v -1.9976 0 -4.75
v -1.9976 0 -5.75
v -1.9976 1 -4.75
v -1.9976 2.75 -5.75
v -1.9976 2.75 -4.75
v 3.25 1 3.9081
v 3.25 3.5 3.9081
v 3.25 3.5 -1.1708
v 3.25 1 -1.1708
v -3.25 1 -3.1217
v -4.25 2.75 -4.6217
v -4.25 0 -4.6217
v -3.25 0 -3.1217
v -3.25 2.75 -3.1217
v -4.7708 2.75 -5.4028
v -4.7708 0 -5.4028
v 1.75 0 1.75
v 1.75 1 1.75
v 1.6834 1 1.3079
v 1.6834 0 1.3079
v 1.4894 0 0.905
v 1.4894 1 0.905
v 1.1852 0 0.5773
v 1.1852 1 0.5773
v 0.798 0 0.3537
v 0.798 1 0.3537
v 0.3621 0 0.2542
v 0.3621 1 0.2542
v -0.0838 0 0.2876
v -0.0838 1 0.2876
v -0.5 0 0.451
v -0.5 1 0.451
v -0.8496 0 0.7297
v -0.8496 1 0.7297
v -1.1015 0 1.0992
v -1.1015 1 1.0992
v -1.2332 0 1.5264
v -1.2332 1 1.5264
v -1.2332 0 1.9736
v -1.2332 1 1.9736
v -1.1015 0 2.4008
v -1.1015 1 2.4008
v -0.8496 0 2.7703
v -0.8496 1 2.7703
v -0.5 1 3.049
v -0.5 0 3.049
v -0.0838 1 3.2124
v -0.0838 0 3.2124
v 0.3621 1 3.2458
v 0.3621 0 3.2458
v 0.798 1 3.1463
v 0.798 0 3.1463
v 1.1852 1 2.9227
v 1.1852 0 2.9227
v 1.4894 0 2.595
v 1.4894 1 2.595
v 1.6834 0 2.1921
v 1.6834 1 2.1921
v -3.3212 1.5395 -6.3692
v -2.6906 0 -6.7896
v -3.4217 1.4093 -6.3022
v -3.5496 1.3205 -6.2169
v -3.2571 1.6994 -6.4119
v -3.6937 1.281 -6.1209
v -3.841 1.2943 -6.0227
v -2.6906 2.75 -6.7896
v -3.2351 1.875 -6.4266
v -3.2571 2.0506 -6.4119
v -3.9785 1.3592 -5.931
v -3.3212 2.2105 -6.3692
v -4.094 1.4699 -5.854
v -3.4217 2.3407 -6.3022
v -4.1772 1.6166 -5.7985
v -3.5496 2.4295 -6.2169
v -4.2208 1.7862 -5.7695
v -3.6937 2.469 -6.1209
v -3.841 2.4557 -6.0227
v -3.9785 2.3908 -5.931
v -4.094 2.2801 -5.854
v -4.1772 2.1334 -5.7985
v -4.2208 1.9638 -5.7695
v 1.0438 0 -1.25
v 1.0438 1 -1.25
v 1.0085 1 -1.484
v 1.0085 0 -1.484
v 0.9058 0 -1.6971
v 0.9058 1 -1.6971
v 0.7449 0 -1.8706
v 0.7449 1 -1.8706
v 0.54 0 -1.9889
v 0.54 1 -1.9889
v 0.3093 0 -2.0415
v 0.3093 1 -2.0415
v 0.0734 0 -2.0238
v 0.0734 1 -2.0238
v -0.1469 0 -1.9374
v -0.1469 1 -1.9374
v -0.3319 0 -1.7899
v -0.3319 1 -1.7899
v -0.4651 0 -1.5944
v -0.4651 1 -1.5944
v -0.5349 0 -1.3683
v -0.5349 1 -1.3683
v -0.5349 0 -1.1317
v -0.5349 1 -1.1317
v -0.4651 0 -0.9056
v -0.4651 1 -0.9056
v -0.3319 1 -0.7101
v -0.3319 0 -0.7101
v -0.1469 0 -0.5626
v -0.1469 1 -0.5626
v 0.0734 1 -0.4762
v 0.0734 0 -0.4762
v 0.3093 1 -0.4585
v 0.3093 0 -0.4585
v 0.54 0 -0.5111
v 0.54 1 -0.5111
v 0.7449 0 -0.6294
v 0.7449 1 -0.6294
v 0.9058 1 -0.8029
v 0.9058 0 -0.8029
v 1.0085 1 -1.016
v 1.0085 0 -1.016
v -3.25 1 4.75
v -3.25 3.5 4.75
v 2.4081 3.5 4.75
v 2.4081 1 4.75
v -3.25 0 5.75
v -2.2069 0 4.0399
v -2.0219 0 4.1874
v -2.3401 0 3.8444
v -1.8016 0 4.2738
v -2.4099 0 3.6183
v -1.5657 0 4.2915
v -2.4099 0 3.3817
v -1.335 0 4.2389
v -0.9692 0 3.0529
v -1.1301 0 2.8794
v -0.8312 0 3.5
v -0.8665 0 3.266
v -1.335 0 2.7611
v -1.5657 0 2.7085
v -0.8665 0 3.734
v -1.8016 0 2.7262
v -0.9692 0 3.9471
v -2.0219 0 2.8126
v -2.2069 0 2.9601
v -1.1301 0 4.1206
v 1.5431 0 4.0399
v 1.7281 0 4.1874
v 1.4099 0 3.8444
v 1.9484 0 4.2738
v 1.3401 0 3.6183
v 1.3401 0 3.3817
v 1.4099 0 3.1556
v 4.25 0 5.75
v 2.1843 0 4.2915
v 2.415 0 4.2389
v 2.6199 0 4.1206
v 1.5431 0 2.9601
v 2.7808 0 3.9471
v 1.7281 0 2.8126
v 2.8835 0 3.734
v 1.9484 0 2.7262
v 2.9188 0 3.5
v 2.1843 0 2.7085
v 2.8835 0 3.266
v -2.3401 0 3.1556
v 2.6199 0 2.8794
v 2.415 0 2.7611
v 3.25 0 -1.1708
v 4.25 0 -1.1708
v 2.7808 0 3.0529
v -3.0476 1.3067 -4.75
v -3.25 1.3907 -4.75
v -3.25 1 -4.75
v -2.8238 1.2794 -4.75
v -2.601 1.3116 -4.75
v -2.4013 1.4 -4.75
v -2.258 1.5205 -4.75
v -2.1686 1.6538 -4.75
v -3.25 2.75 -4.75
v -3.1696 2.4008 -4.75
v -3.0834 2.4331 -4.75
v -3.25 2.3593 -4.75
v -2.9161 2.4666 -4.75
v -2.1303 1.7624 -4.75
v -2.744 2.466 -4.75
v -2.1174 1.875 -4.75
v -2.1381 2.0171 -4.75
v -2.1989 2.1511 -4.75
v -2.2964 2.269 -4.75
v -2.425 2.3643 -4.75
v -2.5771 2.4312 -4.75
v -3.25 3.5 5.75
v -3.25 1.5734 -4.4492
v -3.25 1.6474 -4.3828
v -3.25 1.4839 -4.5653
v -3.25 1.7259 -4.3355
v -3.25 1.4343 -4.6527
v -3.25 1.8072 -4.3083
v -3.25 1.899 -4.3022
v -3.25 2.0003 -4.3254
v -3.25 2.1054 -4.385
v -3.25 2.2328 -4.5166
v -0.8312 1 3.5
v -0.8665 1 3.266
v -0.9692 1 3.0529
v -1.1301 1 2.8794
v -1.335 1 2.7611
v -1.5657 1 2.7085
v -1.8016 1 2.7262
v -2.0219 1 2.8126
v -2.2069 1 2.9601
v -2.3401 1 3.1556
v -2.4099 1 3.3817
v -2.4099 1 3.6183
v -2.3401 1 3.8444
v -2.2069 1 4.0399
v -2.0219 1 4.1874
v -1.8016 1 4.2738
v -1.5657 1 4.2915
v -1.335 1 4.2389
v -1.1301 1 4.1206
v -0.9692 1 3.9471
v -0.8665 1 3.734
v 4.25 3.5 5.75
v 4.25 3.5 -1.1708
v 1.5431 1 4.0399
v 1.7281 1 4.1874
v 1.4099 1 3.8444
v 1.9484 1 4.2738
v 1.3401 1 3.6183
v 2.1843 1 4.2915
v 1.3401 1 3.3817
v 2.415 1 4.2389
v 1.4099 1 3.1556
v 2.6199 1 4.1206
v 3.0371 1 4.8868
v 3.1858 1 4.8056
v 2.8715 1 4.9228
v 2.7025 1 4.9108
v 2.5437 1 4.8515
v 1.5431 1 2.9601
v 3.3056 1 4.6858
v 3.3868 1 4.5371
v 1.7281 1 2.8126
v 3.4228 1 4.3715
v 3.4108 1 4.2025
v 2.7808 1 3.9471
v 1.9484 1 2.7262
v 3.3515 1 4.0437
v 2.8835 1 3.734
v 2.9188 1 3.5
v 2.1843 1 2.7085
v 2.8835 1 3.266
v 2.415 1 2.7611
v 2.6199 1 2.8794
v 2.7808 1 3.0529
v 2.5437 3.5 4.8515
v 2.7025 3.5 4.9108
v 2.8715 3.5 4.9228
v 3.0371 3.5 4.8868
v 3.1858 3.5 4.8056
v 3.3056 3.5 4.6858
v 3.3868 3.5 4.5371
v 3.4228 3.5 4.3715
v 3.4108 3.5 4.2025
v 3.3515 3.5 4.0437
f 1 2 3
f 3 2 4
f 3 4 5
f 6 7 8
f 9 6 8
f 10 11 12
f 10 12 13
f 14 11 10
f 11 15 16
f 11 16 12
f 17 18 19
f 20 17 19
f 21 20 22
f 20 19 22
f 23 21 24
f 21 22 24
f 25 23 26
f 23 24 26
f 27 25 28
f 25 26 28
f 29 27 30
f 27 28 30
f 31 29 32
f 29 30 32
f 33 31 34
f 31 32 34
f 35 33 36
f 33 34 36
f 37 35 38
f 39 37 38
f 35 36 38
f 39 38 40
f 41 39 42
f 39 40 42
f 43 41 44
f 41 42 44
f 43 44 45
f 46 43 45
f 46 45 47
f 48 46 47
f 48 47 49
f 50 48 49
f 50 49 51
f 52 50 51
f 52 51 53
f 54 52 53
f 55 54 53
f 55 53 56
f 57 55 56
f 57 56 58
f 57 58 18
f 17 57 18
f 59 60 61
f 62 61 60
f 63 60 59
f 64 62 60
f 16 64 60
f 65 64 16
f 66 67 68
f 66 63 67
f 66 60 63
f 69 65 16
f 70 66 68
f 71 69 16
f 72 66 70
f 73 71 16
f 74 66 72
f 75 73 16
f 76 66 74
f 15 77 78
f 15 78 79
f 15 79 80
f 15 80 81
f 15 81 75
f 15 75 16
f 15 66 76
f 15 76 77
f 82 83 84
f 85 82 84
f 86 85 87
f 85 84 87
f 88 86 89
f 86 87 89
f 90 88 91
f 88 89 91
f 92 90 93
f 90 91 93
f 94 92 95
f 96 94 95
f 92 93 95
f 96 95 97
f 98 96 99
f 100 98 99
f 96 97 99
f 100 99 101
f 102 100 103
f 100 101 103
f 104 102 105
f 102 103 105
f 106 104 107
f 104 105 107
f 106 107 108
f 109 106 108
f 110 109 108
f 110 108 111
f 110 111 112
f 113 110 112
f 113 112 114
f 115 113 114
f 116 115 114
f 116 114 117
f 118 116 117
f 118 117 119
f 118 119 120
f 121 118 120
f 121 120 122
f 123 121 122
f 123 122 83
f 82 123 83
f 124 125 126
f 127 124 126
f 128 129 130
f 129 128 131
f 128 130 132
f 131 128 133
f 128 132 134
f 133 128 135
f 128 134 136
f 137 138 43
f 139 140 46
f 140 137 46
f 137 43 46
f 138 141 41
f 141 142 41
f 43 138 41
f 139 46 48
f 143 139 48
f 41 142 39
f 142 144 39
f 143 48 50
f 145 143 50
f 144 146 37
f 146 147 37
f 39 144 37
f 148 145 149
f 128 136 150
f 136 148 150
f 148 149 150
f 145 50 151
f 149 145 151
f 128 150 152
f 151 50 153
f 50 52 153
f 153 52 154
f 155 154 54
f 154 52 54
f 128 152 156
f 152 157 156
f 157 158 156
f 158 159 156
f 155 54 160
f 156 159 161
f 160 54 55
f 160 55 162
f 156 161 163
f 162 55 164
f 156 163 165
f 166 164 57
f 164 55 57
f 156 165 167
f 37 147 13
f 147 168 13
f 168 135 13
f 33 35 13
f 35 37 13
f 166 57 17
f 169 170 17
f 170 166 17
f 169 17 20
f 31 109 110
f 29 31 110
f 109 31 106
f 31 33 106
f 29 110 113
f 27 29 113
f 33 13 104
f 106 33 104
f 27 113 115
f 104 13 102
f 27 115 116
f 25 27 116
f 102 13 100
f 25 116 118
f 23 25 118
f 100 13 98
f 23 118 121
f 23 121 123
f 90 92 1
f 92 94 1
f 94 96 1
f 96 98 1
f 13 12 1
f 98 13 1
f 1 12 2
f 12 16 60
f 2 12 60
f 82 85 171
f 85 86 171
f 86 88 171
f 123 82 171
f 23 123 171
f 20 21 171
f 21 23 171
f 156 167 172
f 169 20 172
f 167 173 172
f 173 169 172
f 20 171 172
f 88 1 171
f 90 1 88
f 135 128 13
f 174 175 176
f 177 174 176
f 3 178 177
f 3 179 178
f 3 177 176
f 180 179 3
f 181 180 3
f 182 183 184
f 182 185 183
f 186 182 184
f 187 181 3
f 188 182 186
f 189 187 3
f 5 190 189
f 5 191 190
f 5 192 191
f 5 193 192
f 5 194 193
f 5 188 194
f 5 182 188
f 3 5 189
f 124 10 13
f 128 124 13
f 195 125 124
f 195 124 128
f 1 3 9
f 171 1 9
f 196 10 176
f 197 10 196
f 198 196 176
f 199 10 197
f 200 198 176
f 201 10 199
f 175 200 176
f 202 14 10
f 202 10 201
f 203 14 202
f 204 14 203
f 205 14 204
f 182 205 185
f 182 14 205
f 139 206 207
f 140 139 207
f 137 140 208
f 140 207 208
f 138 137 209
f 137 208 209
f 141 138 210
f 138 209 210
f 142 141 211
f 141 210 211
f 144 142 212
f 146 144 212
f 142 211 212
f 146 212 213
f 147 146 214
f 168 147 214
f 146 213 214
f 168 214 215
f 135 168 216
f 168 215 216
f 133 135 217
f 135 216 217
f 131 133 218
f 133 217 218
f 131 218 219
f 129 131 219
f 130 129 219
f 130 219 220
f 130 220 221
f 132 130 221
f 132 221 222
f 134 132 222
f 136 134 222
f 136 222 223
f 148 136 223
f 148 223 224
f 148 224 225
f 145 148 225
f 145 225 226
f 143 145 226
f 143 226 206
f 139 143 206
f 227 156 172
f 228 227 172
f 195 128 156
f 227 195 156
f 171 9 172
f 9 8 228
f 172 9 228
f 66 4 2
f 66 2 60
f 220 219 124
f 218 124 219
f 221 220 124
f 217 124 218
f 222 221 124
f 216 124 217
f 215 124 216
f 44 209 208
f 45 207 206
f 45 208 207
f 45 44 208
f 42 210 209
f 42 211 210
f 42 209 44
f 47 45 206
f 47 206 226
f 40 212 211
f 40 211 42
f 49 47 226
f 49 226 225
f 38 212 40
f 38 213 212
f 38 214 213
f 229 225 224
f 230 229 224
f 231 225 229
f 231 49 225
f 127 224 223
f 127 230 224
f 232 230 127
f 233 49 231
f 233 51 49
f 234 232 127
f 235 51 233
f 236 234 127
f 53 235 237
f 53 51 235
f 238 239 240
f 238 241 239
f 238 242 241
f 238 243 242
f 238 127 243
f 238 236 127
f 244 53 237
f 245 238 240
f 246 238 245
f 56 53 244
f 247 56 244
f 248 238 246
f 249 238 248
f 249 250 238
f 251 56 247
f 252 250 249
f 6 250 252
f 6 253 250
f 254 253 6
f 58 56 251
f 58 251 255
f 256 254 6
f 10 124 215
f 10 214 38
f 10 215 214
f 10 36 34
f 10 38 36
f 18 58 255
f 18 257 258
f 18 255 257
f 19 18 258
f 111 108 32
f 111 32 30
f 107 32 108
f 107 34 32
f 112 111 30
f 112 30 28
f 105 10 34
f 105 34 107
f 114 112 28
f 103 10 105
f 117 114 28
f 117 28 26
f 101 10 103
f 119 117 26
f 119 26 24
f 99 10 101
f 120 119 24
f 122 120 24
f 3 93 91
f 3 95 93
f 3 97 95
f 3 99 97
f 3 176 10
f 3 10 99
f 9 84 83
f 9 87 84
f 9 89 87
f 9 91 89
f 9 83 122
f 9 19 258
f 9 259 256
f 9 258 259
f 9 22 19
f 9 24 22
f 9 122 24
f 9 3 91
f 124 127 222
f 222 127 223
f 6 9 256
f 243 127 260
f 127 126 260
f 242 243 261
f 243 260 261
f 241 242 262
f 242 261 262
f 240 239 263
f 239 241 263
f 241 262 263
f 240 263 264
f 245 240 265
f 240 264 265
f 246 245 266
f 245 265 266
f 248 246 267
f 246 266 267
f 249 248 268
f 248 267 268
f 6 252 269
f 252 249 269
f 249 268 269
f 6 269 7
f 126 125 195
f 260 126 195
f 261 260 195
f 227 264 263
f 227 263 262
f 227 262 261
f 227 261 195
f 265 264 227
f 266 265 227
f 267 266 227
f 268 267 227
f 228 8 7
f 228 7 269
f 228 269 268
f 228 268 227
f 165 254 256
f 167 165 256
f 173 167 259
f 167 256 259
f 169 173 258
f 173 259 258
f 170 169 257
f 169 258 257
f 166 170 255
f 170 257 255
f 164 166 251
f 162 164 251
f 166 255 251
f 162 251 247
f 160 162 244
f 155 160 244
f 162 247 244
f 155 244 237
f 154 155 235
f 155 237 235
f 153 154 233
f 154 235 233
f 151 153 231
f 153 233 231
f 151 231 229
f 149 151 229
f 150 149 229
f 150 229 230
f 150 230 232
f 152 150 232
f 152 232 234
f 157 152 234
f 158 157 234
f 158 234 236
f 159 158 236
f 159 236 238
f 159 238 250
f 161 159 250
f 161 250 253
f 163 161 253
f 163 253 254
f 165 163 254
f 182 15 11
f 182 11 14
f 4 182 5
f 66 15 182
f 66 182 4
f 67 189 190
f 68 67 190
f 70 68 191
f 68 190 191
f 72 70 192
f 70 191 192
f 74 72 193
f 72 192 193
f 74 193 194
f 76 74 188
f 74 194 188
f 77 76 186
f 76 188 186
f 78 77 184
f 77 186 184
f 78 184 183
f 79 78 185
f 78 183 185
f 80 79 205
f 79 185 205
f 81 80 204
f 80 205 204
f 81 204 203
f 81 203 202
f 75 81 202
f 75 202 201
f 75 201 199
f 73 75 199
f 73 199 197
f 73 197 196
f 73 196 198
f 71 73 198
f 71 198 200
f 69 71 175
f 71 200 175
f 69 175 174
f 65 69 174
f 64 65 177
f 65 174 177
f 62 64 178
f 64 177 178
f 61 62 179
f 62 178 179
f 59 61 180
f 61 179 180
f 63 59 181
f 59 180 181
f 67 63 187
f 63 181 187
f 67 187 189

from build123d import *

# Parameters (mm, degrees)
SKETCH1_W                     = 8.5
SKETCH1_H                     = 11.5
BOSS_EXTRUDE1_DEPTH           = 3.5
SKETCH2_W                     = 6.5
SKETCH2_H                     = 9.5
CUT_EXTRUDE1_DEPTH            = 2.5
SKETCH3_R                     = 1.5
CUT_EXTRUDE2_DEPTH            = 2
SKETCH6_R                     = 0.5953125
CUT_EXTRUDE5_DEPTH            = 2.5
SKETCH7_R                     = 0.79375
CUT_EXTRUDE6_DEPTH            = 2
BOSS_EXTRUDE2_DEPTH           = 3.5
SKETCH14_W                    = 5.965258944
SKETCH14_H                    = 5.132960456
CUT_EXTRUDE8_DEPTH            = 0.75
TAP_DRILL_FOR_0_80_TAP1_D     = 1.19126
TAP_DRILL_FOR_0_80_TAP1_DEPTH = 7.11
TAP_DRILL_FOR_0_80_TAP1_TIP   = 0.357890611
CUT_EXTRUDE7_REACH            = 5.5


with BuildPart() as part:
    # Sketch1 → Boss-Extrude1 (new body)
    with BuildSketch(Plane(origin=(0, 0, 0), x_dir=(1, 0, 0), z_dir=(0, 1, 0))):
        Rectangle(SKETCH1_W, SKETCH1_H)
    extrude(amount=BOSS_EXTRUDE1_DEPTH)

    # Sketch2 → Cut-Extrude1 (cut)
    with BuildSketch(Plane(origin=(0, 3.5, 0), x_dir=(1, 0, 0), z_dir=(0, 1, 0))):
        Rectangle(SKETCH2_W, SKETCH2_H)
    extrude(amount=-CUT_EXTRUDE1_DEPTH, mode=Mode.SUBTRACT)

    # Sketch3 → Cut-Extrude2 (cut, through all)
    with BuildSketch(Plane(origin=(0, 1, 0), x_dir=(1, 0, 0), z_dir=(0, 1, 0))):
        with Locations((0.25, -1.75)):
            Circle(SKETCH3_R)
    extrude(amount=-CUT_EXTRUDE2_DEPTH, mode=Mode.SUBTRACT)

    # Sketch6 → Cut-Extrude5 (cut)
    with BuildSketch(Plane(origin=(0, 3.5, 0), x_dir=(1, 0, 0), z_dir=(0, 1, 0))):
        with Locations((2.829050494, -4.329050494)):
            Circle(SKETCH6_R)
    extrude(amount=-CUT_EXTRUDE5_DEPTH, mode=Mode.SUBTRACT)

    # Sketch7 → Cut-Extrude6 (cut, through all)
    with BuildSketch(Plane(origin=(0, 1, 0), x_dir=(1, 0, 0), z_dir=(0, 1, 0))):
        with Locations((0.25, 1.25)):
            Circle(SKETCH7_R)
        with Locations((-1.625, -3.5)):
            Circle(SKETCH7_R)
        with Locations((2.125, -3.5)):
            Circle(SKETCH7_R)
    extrude(amount=-CUT_EXTRUDE6_DEPTH, mode=Mode.SUBTRACT)

    # Sketch9 → Boss-Extrude2 (add)
    with BuildSketch(Plane(origin=(0, 3.5, 0), x_dir=(1, 0, 0), z_dir=(0, 1, 0))):
        Polygon((-2.69064642, 6.789569053), (-4.770772156, 5.402818562), (-4.001541387, 4.248972409), (-3.411634369, 4.642243754), (-2.511322669, 5.242451554), (-1.921415651, 5.635722899), align=None)
    extrude(amount=-BOSS_EXTRUDE2_DEPTH)

    # Sketch14 → Cut-Extrude8 (cut)
    with BuildSketch(Plane(origin=(0, 3.5, 0), x_dir=(1, 0, 0), z_dir=(0, 1, 0))):
        with Locations((-3.25, 4.75)):
            Rectangle(SKETCH14_W, SKETCH14_H)
    extrude(amount=-CUT_EXTRUDE8_DEPTH, mode=Mode.SUBTRACT)

    # Tap Drill for #0-80 Tap1
    with Locations(Plane(origin=(-3.961538462, 0, -5.942307692), x_dir=(-0.832050294, 0, 0.554700196), z_dir=(-0.554700196, 0, -0.832050294))):
        with Locations((-0.27742214, 1.875)):
            Hole(TAP_DRILL_FOR_0_80_TAP1_D / 2, depth=TAP_DRILL_FOR_0_80_TAP1_DEPTH)
            with Locations((0, 0, -(TAP_DRILL_FOR_0_80_TAP1_DEPTH + TAP_DRILL_FOR_0_80_TAP1_TIP / 2))):  # 118° drill point
                Cone(0, TAP_DRILL_FOR_0_80_TAP1_D / 2, TAP_DRILL_FOR_0_80_TAP1_TIP, mode=Mode.SUBTRACT)

    # Sketch13 → Cut-Extrude7 (cut, up to next)
    with BuildSketch(Plane(origin=(0, 3.5, 0), x_dir=(1, 0, 0), z_dir=(0, 1, 0)), mode=Mode.PRIVATE) as cut_extrude7_sk1:
        Polygon((-1.997600385, 5.75), (-1.997600385, 4.75), (3.25, 1.170806318), (4.25, 1.170806318), (4.25, 5.75), align=None)
    cut_extrude7_tool1 = extrude(cut_extrude7_sk1.sketch, amount=-CUT_EXTRUDE7_REACH, mode=Mode.PRIVATE) & part.part
    add(cut_extrude7_tool1.solids().sort_by_distance((1.797917, 3.5, -3.996239))[0], mode=Mode.SUBTRACT)
    # Sketch13 → Cut-Extrude7 (cut, up to next)
    with BuildSketch(Plane(origin=(0, 3.5, 0), x_dir=(1, 0, 0), z_dir=(0, 1, 0)), mode=Mode.PRIVATE) as cut_extrude7_sk2:
        Polygon((-4.25, 4.621660328), (-3.25, 3.121660328), (-3.25, -5.75), (-4.25, -5.75), align=None)
    cut_extrude7_tool2 = extrude(cut_extrude7_sk2.sketch, amount=-CUT_EXTRUDE7_REACH, mode=Mode.PRIVATE) & part.part
    add(cut_extrude7_tool2.solids().sort_by_distance((-3.762992, 3.5, 0.929426))[0], mode=Mode.SUBTRACT)


solid = part.part
